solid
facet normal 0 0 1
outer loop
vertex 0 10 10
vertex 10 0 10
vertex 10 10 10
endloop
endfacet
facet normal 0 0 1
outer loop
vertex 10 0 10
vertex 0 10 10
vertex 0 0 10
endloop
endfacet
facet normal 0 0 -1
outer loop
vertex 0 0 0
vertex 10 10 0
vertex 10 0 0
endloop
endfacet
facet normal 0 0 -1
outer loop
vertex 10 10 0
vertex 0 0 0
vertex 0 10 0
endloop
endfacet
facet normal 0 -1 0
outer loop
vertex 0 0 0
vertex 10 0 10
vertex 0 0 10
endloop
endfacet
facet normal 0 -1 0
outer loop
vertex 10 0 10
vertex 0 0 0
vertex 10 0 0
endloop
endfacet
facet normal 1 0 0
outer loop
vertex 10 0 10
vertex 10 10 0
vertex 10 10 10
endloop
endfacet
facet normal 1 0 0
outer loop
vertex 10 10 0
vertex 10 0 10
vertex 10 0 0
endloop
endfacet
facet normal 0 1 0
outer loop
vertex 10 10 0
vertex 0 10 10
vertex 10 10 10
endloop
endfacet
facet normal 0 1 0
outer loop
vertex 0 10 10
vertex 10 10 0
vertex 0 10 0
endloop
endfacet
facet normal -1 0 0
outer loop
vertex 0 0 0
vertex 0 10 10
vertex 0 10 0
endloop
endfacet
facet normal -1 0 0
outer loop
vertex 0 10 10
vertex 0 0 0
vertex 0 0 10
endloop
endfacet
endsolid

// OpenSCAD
// SYMPTOM: import aborted during parse with KeyError: 'file' (or, for a file
//   without a dot like file = "45", ValueError: not enough values to unpack).
//   A childless rotate_extrude() compiles to the same SEMICOLON form that a
//   profile-importing rotate_extrude uses: rotate_extrude(angle=360, ...);
// CAUSE: p_rotate_extrude_file assumed the 'file' kwarg was always present and
//   did p[3]['file'].rsplit('.', 1).
// FIX: importCSG.py p_rotate_extrude_file -> if 'file' not in p[3]: return []
//   (revolves nothing -> empty), and pad the extension split so a dot-less file
//   no longer fails to unpack. Commit 12cbeaa3b2.
// EXPECTED (OpenSCAD): a childless rotate_extrude renders empty; a sibling cube
//   in the same union imports unaffected.
union() {
	rotate_extrude();
	cube([10, 10, 10]);
}
